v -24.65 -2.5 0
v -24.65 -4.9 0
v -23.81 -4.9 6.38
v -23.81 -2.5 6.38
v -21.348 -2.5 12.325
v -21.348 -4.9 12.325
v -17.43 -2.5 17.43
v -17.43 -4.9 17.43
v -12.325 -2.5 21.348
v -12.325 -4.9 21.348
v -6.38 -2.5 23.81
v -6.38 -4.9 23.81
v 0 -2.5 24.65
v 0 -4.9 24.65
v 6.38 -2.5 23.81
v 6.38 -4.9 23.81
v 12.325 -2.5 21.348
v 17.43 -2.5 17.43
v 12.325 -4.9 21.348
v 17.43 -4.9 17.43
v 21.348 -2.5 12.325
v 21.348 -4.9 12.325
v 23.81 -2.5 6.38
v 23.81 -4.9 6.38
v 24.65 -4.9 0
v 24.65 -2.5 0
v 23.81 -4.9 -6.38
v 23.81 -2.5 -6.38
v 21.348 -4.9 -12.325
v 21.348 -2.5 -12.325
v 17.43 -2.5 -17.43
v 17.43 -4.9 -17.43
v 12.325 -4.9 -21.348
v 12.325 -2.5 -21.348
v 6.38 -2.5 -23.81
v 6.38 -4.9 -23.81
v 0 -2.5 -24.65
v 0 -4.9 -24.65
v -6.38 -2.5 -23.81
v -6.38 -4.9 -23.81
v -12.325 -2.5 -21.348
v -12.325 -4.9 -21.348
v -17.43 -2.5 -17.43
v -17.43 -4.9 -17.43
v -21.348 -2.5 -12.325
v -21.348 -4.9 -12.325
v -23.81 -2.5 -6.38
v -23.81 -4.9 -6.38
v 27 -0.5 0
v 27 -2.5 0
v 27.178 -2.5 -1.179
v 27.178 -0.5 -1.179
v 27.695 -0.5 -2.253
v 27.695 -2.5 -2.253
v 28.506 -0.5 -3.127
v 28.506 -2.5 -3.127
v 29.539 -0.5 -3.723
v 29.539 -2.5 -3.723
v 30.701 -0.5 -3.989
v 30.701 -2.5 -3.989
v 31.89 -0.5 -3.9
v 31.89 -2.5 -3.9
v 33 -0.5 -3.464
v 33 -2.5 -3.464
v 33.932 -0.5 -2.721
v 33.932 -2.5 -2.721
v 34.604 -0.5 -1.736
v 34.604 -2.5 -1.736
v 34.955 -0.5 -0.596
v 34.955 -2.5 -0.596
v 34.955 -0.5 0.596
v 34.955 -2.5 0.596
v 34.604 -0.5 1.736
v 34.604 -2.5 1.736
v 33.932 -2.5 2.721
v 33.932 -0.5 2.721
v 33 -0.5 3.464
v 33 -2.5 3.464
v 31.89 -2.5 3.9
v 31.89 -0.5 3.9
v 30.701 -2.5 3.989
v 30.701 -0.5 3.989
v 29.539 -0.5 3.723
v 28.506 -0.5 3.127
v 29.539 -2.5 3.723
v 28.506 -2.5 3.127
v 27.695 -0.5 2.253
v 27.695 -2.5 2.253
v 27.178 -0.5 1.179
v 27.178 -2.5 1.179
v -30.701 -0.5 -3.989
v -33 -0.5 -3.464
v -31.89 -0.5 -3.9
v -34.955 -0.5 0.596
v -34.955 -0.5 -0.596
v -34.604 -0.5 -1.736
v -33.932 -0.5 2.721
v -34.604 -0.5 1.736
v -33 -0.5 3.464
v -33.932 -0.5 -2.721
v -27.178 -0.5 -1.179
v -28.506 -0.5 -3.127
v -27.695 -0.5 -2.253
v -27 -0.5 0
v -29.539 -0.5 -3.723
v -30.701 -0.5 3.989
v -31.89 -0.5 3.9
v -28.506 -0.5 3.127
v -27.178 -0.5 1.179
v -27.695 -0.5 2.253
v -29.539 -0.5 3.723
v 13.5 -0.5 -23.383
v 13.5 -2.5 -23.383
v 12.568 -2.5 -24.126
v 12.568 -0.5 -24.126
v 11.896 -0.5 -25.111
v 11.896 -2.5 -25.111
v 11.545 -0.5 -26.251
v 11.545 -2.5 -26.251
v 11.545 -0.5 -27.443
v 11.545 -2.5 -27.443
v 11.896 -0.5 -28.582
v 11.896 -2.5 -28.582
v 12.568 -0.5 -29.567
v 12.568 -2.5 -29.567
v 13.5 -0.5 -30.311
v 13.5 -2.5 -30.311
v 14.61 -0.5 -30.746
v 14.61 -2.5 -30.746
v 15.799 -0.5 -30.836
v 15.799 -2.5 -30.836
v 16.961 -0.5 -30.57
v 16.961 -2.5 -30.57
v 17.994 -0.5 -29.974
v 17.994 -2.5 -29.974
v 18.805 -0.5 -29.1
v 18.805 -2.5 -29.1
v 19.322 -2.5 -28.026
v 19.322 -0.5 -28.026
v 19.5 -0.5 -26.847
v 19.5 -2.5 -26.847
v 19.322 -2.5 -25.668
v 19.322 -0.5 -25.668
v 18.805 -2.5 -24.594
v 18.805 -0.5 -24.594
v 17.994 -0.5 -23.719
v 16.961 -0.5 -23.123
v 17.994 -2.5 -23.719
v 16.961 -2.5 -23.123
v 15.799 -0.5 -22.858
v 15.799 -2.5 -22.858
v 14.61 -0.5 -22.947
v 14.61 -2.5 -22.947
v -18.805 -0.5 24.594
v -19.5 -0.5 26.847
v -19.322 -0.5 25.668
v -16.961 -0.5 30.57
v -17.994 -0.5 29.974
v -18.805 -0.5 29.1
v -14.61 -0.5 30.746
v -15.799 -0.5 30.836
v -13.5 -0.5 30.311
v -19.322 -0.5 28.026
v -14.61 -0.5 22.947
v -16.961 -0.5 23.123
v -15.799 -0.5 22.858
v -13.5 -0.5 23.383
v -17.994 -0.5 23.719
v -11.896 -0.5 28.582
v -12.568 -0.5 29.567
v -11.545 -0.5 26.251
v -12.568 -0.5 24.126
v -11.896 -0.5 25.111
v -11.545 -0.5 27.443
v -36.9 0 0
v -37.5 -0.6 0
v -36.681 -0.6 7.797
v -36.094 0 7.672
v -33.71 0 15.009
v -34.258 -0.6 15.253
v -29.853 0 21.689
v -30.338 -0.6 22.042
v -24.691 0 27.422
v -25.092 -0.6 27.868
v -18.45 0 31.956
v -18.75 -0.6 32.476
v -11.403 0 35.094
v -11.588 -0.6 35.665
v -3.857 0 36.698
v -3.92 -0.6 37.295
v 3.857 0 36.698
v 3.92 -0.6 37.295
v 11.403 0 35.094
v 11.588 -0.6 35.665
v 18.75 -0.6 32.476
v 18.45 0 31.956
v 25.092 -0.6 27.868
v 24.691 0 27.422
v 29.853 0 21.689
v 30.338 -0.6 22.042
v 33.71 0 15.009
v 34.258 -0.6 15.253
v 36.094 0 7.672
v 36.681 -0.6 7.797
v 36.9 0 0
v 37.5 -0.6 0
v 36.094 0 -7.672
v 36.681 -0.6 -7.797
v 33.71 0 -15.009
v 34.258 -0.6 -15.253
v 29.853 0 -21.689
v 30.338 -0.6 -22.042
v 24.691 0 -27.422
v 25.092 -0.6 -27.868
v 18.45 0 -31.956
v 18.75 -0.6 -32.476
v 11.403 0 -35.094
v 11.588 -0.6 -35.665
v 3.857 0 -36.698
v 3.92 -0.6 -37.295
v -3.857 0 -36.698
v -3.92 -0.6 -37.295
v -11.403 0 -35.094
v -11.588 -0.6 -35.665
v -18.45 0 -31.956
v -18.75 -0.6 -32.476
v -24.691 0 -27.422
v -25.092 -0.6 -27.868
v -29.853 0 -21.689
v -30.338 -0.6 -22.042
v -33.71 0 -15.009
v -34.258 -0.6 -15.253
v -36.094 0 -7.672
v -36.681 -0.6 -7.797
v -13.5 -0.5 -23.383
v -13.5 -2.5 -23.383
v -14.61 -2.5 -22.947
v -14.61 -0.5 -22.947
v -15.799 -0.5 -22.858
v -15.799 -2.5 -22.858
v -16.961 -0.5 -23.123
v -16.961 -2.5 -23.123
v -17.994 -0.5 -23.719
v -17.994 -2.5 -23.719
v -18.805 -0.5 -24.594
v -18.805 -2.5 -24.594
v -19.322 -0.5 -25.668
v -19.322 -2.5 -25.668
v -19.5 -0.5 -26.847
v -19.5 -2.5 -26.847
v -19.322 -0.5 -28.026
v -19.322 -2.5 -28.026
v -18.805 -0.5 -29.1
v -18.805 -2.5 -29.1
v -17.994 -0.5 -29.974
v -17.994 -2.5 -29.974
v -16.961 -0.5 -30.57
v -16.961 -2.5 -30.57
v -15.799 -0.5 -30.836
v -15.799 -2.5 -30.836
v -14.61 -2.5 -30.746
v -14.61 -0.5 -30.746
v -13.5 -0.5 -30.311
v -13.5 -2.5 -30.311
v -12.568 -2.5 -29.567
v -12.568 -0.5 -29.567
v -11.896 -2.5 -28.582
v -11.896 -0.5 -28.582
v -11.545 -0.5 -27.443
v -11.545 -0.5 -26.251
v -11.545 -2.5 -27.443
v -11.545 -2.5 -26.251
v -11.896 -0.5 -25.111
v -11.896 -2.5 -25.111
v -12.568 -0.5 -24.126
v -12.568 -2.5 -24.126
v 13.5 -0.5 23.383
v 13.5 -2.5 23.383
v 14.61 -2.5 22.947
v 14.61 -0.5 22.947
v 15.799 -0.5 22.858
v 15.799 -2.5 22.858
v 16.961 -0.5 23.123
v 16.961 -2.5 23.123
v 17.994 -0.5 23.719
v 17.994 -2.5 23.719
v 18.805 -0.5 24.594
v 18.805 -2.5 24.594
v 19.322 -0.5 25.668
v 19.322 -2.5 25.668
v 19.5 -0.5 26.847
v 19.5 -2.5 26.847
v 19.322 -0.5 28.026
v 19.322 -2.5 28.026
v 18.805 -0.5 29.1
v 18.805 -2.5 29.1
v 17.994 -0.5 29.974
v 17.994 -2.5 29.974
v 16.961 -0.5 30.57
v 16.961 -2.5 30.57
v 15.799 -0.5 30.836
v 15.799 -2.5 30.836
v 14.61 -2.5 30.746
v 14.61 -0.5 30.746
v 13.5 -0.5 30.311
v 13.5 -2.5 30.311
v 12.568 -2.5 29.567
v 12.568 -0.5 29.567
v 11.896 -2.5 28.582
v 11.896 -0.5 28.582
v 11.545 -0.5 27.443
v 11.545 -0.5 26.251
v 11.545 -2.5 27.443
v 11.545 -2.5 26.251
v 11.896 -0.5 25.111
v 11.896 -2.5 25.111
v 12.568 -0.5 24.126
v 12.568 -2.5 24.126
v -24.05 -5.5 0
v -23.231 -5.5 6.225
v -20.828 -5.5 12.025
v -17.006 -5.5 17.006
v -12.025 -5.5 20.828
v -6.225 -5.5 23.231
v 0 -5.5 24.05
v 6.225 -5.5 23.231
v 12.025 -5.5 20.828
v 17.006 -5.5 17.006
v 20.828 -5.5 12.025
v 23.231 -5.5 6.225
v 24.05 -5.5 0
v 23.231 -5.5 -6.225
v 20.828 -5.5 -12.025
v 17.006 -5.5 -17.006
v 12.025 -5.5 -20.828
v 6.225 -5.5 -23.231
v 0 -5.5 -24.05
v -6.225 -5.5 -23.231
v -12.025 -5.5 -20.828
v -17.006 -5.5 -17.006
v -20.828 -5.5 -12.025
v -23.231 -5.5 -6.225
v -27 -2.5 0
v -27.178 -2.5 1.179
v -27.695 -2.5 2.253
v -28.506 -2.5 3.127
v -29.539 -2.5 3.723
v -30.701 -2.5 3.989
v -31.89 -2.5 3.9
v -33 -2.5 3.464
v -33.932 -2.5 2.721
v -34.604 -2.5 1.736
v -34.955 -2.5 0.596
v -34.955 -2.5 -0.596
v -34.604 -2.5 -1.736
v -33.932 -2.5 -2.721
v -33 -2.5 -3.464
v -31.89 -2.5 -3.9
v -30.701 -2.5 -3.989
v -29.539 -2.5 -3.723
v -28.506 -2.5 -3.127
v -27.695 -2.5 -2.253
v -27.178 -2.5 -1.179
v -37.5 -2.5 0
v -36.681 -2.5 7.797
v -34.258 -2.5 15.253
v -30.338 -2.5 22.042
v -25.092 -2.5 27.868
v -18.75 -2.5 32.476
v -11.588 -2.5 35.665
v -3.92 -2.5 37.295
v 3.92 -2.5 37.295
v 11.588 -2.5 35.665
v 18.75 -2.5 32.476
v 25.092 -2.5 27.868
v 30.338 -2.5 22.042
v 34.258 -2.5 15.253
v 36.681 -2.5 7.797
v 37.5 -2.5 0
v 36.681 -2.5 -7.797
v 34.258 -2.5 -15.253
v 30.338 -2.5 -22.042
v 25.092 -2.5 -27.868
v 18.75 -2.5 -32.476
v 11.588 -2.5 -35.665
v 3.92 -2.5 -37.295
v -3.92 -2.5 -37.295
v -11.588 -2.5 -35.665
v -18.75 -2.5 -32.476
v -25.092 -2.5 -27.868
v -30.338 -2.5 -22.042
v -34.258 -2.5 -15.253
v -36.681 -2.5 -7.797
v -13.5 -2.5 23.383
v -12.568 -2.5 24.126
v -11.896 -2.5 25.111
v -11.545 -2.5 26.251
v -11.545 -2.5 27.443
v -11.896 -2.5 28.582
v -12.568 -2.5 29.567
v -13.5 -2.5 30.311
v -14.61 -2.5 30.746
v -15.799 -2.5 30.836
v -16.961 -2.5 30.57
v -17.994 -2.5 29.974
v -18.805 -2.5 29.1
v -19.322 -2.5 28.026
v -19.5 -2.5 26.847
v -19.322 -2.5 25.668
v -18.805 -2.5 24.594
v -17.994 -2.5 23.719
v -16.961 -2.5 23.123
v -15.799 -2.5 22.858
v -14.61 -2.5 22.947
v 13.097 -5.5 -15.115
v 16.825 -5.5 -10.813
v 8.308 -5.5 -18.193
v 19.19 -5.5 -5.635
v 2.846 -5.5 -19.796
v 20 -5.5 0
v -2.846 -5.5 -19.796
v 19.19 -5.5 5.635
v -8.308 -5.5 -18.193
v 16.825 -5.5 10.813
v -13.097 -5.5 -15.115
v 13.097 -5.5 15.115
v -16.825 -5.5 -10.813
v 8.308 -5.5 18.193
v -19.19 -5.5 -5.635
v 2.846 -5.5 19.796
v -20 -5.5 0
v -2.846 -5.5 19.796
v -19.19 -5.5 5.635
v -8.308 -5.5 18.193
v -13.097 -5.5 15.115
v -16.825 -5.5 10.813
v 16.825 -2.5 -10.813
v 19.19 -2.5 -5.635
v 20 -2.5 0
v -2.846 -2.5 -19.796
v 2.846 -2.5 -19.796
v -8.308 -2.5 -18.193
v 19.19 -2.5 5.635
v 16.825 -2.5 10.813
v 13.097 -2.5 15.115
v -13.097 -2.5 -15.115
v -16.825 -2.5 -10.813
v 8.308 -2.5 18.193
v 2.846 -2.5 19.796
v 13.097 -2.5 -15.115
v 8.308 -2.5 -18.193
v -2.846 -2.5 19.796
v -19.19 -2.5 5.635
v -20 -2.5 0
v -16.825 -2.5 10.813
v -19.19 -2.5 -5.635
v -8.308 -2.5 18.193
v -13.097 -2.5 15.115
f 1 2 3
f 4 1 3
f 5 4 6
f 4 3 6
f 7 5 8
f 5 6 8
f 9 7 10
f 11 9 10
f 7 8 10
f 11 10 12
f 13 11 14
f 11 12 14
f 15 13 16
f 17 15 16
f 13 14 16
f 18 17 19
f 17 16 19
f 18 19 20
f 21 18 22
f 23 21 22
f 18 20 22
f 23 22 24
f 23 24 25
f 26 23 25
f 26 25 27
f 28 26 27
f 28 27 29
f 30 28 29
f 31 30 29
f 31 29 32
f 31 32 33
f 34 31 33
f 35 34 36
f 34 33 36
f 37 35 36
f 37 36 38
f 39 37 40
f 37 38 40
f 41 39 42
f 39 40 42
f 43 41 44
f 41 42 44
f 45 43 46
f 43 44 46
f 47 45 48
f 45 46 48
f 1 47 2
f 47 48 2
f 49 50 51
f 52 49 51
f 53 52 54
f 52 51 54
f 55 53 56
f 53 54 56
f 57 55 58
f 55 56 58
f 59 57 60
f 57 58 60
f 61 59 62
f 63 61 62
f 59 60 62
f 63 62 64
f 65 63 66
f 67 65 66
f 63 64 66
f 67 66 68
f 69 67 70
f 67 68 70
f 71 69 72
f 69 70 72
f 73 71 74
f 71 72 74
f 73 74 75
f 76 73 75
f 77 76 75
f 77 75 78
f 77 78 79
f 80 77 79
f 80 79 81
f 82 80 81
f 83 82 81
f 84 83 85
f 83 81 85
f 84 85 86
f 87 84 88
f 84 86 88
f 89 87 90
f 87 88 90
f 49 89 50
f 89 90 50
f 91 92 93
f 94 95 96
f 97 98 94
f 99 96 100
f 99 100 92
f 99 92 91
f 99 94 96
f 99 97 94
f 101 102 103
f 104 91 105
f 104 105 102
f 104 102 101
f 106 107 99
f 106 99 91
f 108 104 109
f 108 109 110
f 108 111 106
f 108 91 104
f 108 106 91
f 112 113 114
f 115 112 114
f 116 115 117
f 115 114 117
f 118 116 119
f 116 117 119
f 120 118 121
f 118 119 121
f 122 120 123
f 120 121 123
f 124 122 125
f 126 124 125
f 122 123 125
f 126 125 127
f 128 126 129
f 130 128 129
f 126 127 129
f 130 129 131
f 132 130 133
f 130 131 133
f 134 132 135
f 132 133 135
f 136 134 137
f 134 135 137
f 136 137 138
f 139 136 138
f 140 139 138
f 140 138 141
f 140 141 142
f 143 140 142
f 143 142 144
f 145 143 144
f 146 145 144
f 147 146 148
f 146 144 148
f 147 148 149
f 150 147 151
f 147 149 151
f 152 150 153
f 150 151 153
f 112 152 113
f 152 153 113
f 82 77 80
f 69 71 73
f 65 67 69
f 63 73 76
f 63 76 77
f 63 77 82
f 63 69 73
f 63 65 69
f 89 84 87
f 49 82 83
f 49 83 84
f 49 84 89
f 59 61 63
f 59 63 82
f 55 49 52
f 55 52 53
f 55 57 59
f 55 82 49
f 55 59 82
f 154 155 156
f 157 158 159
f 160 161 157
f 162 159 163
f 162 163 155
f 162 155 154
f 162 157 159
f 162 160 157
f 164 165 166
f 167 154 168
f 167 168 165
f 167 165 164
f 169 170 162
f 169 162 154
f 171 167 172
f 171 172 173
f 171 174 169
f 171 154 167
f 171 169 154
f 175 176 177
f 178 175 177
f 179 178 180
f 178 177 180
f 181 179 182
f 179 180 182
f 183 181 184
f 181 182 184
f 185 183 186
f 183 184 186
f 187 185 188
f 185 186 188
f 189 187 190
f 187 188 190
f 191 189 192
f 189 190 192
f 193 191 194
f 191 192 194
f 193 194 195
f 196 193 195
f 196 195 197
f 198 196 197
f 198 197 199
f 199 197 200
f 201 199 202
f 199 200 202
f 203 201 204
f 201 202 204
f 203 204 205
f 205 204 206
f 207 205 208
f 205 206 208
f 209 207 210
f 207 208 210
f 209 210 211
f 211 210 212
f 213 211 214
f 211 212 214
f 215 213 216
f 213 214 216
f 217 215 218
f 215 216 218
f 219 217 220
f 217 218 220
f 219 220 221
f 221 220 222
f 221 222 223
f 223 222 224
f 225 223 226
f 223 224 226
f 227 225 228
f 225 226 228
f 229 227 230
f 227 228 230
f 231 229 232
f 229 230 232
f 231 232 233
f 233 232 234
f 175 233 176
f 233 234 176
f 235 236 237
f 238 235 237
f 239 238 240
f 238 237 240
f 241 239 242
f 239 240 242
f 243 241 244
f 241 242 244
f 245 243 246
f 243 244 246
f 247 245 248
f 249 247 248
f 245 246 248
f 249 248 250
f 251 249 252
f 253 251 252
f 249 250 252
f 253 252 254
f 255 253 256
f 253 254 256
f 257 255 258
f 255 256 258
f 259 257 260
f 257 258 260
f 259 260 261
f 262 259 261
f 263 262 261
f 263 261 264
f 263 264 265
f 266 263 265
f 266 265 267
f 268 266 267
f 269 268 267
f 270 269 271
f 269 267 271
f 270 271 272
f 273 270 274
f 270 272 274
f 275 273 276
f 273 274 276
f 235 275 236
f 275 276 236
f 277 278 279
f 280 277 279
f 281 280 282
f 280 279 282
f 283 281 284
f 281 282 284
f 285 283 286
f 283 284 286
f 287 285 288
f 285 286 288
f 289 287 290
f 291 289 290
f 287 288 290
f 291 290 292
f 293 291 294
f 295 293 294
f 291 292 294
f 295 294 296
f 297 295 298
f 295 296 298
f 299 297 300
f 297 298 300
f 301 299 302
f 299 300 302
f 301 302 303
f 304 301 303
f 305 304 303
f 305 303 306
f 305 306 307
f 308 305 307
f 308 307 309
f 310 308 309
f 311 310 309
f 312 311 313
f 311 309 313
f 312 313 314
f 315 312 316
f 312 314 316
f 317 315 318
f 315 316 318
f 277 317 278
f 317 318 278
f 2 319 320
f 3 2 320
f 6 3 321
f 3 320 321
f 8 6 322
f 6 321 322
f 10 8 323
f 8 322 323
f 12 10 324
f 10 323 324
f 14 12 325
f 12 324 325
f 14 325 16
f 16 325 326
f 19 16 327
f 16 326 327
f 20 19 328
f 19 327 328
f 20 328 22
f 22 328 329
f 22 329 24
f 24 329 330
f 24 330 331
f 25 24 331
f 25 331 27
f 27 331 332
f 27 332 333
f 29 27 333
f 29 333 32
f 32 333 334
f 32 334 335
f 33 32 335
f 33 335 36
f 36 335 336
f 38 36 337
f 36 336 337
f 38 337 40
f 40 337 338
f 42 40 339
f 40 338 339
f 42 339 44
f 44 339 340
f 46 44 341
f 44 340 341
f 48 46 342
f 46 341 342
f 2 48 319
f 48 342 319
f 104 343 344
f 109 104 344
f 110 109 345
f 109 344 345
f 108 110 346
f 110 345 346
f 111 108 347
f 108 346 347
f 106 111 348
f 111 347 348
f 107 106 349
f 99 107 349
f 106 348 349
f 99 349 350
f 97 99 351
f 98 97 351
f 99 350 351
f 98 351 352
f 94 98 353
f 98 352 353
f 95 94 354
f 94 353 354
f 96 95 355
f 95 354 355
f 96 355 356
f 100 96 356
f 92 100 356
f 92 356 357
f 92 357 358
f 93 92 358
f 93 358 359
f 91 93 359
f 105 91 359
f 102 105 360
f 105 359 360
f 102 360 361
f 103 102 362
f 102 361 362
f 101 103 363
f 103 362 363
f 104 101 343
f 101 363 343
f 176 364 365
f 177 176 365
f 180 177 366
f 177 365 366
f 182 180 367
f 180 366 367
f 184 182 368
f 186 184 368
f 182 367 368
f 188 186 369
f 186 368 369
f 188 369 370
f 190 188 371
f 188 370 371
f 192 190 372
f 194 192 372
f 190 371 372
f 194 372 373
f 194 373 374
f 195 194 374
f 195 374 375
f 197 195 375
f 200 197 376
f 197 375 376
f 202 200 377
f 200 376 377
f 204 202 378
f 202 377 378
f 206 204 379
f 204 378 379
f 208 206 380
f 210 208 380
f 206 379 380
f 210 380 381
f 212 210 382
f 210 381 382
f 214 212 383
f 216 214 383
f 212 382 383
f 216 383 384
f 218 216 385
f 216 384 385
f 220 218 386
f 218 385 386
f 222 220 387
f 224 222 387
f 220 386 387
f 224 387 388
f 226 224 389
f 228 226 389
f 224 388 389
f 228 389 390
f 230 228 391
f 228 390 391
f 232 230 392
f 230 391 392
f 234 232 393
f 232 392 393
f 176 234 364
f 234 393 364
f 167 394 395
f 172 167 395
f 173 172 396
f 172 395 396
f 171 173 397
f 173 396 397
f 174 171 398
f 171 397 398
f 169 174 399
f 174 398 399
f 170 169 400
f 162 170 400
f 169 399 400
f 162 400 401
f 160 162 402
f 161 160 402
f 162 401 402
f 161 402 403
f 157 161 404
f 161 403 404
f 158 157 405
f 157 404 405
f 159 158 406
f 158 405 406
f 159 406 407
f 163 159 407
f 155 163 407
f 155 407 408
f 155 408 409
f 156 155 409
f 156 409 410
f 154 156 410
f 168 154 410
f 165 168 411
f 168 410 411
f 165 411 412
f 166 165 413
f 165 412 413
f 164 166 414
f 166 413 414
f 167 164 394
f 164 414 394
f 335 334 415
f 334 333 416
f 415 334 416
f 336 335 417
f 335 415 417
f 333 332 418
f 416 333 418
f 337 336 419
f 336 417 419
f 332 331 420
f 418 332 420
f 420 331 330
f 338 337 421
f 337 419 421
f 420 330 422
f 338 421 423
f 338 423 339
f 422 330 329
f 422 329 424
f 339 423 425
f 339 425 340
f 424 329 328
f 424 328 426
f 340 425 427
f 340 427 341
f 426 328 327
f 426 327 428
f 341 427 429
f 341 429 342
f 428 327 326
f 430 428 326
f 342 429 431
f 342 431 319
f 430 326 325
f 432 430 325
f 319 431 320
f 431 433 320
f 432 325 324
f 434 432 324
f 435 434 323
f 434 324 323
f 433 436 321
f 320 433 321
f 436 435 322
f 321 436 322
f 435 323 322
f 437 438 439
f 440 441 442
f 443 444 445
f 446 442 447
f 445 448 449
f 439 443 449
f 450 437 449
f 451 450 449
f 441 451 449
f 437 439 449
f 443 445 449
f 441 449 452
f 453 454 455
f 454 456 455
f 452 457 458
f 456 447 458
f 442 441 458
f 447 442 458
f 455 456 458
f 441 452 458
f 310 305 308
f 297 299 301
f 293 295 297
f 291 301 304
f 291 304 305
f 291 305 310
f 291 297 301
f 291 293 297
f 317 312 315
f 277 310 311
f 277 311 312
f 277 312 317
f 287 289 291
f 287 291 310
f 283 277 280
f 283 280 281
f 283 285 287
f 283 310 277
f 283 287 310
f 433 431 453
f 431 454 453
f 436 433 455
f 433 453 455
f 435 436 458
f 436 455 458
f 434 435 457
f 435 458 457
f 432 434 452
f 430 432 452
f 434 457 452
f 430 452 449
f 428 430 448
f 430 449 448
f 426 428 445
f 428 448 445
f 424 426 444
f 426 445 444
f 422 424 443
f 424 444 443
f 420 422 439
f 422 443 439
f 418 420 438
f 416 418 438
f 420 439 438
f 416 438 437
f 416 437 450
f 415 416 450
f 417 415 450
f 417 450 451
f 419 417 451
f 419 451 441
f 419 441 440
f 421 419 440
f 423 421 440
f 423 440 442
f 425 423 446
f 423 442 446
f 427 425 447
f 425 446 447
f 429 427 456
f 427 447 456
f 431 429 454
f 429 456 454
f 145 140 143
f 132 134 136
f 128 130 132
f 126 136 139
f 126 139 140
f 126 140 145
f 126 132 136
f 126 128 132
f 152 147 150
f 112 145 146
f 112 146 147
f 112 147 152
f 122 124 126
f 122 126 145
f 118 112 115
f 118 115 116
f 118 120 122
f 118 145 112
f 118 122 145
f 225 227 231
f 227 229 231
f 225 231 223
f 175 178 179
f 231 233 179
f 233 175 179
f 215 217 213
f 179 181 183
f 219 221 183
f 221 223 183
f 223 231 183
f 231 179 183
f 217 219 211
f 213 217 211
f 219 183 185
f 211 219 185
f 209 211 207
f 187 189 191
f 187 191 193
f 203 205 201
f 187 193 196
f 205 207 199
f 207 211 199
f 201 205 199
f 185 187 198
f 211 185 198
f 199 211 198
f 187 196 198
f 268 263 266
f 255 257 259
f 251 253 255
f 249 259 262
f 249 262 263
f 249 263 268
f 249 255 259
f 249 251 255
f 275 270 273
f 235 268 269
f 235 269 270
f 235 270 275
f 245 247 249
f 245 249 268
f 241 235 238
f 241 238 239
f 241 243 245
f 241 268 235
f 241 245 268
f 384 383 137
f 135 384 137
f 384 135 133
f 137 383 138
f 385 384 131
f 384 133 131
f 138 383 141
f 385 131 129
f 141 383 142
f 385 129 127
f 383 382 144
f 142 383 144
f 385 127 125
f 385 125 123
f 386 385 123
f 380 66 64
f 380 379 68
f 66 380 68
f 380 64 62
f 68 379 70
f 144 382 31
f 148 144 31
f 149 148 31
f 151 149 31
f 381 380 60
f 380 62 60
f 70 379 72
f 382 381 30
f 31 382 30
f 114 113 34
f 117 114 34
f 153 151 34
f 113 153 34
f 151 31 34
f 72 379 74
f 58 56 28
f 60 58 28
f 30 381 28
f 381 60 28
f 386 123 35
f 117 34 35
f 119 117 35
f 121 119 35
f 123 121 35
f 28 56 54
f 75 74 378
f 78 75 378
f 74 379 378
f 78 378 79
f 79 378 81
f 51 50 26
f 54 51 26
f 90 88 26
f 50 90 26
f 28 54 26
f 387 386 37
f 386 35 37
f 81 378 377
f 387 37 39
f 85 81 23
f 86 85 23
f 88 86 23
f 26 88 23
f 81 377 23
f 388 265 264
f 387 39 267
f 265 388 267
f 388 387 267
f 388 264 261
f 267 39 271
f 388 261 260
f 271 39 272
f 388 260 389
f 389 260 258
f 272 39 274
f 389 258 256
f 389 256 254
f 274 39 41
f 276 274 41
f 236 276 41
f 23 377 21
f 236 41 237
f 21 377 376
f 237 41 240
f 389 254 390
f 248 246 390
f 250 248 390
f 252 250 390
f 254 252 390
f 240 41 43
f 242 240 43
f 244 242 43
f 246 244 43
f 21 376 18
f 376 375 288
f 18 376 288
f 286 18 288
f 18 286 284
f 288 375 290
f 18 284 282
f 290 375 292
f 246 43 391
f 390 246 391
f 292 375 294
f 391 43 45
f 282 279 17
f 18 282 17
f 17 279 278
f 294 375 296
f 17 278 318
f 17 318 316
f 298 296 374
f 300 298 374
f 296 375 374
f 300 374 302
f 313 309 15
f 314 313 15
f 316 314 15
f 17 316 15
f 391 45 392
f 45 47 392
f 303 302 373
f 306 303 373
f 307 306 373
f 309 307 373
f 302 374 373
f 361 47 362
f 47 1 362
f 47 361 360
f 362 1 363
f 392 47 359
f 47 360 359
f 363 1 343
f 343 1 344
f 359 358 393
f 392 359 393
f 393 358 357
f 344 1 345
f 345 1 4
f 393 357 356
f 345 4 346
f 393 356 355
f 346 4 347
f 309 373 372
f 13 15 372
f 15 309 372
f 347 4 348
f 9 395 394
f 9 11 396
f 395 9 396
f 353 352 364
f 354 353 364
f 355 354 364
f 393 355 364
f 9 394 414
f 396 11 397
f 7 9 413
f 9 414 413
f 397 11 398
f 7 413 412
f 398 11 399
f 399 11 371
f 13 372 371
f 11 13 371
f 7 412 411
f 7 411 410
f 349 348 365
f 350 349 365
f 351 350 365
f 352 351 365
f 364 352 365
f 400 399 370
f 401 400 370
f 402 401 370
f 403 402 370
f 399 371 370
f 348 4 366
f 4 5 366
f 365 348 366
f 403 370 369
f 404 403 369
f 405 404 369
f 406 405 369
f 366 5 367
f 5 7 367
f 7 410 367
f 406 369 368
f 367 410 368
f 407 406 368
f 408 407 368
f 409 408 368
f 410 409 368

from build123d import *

# Parameters (mm, degrees)
SKETCH_4_R               = 4
CUT_EXTRUDE_1_DEPTH      = 2
PATTERN_CIRCULAR_1_COUNT = 6
CHAMFER_1_SIZE           = 0.6


with BuildPart() as part:
    # Эскиз1 → Повернуть1 (revolve)
    with BuildSketch(Plane.XY):
        Polygon((0, 0), (-37.5, 0), (-37.5, -2.5), (-24.65, -2.5), (-24.65, -5.5), (-20, -5.5), (-20, -2.5), (0, -2.5), align=None)
    revolve(axis=Axis((0, 0, 0), (0, 1, 0)))

    # Эскиз4 → Cut-Extrude 1 (cut)
    with BuildSketch(Plane.XZ.offset(2.5)):
        with Locations((-31, 0)):
            Circle(SKETCH_4_R)
    cut_extrude_1 = extrude(amount=-CUT_EXTRUDE_1_DEPTH, mode=Mode.SUBTRACT)

    # Круговой массив1: Cut-Extrude 1 ×6 about axis
    pattern_circular_1_axis = Axis((0, 0, 0), (0, 1, 0))
    for i in range(1, PATTERN_CIRCULAR_1_COUNT):
        add(cut_extrude_1.rotate(pattern_circular_1_axis, i * 360 / PATTERN_CIRCULAR_1_COUNT), mode=Mode.SUBTRACT)

    # Фаска1
    chamfer_1_edges = [part.edges().sort_by_distance(p)[0] for p in [
        (24.65, -5.5, 0),
        (37.5, 0, 0),
    ]]
    chamfer(chamfer_1_edges, length=CHAMFER_1_SIZE)


solid = part.part
